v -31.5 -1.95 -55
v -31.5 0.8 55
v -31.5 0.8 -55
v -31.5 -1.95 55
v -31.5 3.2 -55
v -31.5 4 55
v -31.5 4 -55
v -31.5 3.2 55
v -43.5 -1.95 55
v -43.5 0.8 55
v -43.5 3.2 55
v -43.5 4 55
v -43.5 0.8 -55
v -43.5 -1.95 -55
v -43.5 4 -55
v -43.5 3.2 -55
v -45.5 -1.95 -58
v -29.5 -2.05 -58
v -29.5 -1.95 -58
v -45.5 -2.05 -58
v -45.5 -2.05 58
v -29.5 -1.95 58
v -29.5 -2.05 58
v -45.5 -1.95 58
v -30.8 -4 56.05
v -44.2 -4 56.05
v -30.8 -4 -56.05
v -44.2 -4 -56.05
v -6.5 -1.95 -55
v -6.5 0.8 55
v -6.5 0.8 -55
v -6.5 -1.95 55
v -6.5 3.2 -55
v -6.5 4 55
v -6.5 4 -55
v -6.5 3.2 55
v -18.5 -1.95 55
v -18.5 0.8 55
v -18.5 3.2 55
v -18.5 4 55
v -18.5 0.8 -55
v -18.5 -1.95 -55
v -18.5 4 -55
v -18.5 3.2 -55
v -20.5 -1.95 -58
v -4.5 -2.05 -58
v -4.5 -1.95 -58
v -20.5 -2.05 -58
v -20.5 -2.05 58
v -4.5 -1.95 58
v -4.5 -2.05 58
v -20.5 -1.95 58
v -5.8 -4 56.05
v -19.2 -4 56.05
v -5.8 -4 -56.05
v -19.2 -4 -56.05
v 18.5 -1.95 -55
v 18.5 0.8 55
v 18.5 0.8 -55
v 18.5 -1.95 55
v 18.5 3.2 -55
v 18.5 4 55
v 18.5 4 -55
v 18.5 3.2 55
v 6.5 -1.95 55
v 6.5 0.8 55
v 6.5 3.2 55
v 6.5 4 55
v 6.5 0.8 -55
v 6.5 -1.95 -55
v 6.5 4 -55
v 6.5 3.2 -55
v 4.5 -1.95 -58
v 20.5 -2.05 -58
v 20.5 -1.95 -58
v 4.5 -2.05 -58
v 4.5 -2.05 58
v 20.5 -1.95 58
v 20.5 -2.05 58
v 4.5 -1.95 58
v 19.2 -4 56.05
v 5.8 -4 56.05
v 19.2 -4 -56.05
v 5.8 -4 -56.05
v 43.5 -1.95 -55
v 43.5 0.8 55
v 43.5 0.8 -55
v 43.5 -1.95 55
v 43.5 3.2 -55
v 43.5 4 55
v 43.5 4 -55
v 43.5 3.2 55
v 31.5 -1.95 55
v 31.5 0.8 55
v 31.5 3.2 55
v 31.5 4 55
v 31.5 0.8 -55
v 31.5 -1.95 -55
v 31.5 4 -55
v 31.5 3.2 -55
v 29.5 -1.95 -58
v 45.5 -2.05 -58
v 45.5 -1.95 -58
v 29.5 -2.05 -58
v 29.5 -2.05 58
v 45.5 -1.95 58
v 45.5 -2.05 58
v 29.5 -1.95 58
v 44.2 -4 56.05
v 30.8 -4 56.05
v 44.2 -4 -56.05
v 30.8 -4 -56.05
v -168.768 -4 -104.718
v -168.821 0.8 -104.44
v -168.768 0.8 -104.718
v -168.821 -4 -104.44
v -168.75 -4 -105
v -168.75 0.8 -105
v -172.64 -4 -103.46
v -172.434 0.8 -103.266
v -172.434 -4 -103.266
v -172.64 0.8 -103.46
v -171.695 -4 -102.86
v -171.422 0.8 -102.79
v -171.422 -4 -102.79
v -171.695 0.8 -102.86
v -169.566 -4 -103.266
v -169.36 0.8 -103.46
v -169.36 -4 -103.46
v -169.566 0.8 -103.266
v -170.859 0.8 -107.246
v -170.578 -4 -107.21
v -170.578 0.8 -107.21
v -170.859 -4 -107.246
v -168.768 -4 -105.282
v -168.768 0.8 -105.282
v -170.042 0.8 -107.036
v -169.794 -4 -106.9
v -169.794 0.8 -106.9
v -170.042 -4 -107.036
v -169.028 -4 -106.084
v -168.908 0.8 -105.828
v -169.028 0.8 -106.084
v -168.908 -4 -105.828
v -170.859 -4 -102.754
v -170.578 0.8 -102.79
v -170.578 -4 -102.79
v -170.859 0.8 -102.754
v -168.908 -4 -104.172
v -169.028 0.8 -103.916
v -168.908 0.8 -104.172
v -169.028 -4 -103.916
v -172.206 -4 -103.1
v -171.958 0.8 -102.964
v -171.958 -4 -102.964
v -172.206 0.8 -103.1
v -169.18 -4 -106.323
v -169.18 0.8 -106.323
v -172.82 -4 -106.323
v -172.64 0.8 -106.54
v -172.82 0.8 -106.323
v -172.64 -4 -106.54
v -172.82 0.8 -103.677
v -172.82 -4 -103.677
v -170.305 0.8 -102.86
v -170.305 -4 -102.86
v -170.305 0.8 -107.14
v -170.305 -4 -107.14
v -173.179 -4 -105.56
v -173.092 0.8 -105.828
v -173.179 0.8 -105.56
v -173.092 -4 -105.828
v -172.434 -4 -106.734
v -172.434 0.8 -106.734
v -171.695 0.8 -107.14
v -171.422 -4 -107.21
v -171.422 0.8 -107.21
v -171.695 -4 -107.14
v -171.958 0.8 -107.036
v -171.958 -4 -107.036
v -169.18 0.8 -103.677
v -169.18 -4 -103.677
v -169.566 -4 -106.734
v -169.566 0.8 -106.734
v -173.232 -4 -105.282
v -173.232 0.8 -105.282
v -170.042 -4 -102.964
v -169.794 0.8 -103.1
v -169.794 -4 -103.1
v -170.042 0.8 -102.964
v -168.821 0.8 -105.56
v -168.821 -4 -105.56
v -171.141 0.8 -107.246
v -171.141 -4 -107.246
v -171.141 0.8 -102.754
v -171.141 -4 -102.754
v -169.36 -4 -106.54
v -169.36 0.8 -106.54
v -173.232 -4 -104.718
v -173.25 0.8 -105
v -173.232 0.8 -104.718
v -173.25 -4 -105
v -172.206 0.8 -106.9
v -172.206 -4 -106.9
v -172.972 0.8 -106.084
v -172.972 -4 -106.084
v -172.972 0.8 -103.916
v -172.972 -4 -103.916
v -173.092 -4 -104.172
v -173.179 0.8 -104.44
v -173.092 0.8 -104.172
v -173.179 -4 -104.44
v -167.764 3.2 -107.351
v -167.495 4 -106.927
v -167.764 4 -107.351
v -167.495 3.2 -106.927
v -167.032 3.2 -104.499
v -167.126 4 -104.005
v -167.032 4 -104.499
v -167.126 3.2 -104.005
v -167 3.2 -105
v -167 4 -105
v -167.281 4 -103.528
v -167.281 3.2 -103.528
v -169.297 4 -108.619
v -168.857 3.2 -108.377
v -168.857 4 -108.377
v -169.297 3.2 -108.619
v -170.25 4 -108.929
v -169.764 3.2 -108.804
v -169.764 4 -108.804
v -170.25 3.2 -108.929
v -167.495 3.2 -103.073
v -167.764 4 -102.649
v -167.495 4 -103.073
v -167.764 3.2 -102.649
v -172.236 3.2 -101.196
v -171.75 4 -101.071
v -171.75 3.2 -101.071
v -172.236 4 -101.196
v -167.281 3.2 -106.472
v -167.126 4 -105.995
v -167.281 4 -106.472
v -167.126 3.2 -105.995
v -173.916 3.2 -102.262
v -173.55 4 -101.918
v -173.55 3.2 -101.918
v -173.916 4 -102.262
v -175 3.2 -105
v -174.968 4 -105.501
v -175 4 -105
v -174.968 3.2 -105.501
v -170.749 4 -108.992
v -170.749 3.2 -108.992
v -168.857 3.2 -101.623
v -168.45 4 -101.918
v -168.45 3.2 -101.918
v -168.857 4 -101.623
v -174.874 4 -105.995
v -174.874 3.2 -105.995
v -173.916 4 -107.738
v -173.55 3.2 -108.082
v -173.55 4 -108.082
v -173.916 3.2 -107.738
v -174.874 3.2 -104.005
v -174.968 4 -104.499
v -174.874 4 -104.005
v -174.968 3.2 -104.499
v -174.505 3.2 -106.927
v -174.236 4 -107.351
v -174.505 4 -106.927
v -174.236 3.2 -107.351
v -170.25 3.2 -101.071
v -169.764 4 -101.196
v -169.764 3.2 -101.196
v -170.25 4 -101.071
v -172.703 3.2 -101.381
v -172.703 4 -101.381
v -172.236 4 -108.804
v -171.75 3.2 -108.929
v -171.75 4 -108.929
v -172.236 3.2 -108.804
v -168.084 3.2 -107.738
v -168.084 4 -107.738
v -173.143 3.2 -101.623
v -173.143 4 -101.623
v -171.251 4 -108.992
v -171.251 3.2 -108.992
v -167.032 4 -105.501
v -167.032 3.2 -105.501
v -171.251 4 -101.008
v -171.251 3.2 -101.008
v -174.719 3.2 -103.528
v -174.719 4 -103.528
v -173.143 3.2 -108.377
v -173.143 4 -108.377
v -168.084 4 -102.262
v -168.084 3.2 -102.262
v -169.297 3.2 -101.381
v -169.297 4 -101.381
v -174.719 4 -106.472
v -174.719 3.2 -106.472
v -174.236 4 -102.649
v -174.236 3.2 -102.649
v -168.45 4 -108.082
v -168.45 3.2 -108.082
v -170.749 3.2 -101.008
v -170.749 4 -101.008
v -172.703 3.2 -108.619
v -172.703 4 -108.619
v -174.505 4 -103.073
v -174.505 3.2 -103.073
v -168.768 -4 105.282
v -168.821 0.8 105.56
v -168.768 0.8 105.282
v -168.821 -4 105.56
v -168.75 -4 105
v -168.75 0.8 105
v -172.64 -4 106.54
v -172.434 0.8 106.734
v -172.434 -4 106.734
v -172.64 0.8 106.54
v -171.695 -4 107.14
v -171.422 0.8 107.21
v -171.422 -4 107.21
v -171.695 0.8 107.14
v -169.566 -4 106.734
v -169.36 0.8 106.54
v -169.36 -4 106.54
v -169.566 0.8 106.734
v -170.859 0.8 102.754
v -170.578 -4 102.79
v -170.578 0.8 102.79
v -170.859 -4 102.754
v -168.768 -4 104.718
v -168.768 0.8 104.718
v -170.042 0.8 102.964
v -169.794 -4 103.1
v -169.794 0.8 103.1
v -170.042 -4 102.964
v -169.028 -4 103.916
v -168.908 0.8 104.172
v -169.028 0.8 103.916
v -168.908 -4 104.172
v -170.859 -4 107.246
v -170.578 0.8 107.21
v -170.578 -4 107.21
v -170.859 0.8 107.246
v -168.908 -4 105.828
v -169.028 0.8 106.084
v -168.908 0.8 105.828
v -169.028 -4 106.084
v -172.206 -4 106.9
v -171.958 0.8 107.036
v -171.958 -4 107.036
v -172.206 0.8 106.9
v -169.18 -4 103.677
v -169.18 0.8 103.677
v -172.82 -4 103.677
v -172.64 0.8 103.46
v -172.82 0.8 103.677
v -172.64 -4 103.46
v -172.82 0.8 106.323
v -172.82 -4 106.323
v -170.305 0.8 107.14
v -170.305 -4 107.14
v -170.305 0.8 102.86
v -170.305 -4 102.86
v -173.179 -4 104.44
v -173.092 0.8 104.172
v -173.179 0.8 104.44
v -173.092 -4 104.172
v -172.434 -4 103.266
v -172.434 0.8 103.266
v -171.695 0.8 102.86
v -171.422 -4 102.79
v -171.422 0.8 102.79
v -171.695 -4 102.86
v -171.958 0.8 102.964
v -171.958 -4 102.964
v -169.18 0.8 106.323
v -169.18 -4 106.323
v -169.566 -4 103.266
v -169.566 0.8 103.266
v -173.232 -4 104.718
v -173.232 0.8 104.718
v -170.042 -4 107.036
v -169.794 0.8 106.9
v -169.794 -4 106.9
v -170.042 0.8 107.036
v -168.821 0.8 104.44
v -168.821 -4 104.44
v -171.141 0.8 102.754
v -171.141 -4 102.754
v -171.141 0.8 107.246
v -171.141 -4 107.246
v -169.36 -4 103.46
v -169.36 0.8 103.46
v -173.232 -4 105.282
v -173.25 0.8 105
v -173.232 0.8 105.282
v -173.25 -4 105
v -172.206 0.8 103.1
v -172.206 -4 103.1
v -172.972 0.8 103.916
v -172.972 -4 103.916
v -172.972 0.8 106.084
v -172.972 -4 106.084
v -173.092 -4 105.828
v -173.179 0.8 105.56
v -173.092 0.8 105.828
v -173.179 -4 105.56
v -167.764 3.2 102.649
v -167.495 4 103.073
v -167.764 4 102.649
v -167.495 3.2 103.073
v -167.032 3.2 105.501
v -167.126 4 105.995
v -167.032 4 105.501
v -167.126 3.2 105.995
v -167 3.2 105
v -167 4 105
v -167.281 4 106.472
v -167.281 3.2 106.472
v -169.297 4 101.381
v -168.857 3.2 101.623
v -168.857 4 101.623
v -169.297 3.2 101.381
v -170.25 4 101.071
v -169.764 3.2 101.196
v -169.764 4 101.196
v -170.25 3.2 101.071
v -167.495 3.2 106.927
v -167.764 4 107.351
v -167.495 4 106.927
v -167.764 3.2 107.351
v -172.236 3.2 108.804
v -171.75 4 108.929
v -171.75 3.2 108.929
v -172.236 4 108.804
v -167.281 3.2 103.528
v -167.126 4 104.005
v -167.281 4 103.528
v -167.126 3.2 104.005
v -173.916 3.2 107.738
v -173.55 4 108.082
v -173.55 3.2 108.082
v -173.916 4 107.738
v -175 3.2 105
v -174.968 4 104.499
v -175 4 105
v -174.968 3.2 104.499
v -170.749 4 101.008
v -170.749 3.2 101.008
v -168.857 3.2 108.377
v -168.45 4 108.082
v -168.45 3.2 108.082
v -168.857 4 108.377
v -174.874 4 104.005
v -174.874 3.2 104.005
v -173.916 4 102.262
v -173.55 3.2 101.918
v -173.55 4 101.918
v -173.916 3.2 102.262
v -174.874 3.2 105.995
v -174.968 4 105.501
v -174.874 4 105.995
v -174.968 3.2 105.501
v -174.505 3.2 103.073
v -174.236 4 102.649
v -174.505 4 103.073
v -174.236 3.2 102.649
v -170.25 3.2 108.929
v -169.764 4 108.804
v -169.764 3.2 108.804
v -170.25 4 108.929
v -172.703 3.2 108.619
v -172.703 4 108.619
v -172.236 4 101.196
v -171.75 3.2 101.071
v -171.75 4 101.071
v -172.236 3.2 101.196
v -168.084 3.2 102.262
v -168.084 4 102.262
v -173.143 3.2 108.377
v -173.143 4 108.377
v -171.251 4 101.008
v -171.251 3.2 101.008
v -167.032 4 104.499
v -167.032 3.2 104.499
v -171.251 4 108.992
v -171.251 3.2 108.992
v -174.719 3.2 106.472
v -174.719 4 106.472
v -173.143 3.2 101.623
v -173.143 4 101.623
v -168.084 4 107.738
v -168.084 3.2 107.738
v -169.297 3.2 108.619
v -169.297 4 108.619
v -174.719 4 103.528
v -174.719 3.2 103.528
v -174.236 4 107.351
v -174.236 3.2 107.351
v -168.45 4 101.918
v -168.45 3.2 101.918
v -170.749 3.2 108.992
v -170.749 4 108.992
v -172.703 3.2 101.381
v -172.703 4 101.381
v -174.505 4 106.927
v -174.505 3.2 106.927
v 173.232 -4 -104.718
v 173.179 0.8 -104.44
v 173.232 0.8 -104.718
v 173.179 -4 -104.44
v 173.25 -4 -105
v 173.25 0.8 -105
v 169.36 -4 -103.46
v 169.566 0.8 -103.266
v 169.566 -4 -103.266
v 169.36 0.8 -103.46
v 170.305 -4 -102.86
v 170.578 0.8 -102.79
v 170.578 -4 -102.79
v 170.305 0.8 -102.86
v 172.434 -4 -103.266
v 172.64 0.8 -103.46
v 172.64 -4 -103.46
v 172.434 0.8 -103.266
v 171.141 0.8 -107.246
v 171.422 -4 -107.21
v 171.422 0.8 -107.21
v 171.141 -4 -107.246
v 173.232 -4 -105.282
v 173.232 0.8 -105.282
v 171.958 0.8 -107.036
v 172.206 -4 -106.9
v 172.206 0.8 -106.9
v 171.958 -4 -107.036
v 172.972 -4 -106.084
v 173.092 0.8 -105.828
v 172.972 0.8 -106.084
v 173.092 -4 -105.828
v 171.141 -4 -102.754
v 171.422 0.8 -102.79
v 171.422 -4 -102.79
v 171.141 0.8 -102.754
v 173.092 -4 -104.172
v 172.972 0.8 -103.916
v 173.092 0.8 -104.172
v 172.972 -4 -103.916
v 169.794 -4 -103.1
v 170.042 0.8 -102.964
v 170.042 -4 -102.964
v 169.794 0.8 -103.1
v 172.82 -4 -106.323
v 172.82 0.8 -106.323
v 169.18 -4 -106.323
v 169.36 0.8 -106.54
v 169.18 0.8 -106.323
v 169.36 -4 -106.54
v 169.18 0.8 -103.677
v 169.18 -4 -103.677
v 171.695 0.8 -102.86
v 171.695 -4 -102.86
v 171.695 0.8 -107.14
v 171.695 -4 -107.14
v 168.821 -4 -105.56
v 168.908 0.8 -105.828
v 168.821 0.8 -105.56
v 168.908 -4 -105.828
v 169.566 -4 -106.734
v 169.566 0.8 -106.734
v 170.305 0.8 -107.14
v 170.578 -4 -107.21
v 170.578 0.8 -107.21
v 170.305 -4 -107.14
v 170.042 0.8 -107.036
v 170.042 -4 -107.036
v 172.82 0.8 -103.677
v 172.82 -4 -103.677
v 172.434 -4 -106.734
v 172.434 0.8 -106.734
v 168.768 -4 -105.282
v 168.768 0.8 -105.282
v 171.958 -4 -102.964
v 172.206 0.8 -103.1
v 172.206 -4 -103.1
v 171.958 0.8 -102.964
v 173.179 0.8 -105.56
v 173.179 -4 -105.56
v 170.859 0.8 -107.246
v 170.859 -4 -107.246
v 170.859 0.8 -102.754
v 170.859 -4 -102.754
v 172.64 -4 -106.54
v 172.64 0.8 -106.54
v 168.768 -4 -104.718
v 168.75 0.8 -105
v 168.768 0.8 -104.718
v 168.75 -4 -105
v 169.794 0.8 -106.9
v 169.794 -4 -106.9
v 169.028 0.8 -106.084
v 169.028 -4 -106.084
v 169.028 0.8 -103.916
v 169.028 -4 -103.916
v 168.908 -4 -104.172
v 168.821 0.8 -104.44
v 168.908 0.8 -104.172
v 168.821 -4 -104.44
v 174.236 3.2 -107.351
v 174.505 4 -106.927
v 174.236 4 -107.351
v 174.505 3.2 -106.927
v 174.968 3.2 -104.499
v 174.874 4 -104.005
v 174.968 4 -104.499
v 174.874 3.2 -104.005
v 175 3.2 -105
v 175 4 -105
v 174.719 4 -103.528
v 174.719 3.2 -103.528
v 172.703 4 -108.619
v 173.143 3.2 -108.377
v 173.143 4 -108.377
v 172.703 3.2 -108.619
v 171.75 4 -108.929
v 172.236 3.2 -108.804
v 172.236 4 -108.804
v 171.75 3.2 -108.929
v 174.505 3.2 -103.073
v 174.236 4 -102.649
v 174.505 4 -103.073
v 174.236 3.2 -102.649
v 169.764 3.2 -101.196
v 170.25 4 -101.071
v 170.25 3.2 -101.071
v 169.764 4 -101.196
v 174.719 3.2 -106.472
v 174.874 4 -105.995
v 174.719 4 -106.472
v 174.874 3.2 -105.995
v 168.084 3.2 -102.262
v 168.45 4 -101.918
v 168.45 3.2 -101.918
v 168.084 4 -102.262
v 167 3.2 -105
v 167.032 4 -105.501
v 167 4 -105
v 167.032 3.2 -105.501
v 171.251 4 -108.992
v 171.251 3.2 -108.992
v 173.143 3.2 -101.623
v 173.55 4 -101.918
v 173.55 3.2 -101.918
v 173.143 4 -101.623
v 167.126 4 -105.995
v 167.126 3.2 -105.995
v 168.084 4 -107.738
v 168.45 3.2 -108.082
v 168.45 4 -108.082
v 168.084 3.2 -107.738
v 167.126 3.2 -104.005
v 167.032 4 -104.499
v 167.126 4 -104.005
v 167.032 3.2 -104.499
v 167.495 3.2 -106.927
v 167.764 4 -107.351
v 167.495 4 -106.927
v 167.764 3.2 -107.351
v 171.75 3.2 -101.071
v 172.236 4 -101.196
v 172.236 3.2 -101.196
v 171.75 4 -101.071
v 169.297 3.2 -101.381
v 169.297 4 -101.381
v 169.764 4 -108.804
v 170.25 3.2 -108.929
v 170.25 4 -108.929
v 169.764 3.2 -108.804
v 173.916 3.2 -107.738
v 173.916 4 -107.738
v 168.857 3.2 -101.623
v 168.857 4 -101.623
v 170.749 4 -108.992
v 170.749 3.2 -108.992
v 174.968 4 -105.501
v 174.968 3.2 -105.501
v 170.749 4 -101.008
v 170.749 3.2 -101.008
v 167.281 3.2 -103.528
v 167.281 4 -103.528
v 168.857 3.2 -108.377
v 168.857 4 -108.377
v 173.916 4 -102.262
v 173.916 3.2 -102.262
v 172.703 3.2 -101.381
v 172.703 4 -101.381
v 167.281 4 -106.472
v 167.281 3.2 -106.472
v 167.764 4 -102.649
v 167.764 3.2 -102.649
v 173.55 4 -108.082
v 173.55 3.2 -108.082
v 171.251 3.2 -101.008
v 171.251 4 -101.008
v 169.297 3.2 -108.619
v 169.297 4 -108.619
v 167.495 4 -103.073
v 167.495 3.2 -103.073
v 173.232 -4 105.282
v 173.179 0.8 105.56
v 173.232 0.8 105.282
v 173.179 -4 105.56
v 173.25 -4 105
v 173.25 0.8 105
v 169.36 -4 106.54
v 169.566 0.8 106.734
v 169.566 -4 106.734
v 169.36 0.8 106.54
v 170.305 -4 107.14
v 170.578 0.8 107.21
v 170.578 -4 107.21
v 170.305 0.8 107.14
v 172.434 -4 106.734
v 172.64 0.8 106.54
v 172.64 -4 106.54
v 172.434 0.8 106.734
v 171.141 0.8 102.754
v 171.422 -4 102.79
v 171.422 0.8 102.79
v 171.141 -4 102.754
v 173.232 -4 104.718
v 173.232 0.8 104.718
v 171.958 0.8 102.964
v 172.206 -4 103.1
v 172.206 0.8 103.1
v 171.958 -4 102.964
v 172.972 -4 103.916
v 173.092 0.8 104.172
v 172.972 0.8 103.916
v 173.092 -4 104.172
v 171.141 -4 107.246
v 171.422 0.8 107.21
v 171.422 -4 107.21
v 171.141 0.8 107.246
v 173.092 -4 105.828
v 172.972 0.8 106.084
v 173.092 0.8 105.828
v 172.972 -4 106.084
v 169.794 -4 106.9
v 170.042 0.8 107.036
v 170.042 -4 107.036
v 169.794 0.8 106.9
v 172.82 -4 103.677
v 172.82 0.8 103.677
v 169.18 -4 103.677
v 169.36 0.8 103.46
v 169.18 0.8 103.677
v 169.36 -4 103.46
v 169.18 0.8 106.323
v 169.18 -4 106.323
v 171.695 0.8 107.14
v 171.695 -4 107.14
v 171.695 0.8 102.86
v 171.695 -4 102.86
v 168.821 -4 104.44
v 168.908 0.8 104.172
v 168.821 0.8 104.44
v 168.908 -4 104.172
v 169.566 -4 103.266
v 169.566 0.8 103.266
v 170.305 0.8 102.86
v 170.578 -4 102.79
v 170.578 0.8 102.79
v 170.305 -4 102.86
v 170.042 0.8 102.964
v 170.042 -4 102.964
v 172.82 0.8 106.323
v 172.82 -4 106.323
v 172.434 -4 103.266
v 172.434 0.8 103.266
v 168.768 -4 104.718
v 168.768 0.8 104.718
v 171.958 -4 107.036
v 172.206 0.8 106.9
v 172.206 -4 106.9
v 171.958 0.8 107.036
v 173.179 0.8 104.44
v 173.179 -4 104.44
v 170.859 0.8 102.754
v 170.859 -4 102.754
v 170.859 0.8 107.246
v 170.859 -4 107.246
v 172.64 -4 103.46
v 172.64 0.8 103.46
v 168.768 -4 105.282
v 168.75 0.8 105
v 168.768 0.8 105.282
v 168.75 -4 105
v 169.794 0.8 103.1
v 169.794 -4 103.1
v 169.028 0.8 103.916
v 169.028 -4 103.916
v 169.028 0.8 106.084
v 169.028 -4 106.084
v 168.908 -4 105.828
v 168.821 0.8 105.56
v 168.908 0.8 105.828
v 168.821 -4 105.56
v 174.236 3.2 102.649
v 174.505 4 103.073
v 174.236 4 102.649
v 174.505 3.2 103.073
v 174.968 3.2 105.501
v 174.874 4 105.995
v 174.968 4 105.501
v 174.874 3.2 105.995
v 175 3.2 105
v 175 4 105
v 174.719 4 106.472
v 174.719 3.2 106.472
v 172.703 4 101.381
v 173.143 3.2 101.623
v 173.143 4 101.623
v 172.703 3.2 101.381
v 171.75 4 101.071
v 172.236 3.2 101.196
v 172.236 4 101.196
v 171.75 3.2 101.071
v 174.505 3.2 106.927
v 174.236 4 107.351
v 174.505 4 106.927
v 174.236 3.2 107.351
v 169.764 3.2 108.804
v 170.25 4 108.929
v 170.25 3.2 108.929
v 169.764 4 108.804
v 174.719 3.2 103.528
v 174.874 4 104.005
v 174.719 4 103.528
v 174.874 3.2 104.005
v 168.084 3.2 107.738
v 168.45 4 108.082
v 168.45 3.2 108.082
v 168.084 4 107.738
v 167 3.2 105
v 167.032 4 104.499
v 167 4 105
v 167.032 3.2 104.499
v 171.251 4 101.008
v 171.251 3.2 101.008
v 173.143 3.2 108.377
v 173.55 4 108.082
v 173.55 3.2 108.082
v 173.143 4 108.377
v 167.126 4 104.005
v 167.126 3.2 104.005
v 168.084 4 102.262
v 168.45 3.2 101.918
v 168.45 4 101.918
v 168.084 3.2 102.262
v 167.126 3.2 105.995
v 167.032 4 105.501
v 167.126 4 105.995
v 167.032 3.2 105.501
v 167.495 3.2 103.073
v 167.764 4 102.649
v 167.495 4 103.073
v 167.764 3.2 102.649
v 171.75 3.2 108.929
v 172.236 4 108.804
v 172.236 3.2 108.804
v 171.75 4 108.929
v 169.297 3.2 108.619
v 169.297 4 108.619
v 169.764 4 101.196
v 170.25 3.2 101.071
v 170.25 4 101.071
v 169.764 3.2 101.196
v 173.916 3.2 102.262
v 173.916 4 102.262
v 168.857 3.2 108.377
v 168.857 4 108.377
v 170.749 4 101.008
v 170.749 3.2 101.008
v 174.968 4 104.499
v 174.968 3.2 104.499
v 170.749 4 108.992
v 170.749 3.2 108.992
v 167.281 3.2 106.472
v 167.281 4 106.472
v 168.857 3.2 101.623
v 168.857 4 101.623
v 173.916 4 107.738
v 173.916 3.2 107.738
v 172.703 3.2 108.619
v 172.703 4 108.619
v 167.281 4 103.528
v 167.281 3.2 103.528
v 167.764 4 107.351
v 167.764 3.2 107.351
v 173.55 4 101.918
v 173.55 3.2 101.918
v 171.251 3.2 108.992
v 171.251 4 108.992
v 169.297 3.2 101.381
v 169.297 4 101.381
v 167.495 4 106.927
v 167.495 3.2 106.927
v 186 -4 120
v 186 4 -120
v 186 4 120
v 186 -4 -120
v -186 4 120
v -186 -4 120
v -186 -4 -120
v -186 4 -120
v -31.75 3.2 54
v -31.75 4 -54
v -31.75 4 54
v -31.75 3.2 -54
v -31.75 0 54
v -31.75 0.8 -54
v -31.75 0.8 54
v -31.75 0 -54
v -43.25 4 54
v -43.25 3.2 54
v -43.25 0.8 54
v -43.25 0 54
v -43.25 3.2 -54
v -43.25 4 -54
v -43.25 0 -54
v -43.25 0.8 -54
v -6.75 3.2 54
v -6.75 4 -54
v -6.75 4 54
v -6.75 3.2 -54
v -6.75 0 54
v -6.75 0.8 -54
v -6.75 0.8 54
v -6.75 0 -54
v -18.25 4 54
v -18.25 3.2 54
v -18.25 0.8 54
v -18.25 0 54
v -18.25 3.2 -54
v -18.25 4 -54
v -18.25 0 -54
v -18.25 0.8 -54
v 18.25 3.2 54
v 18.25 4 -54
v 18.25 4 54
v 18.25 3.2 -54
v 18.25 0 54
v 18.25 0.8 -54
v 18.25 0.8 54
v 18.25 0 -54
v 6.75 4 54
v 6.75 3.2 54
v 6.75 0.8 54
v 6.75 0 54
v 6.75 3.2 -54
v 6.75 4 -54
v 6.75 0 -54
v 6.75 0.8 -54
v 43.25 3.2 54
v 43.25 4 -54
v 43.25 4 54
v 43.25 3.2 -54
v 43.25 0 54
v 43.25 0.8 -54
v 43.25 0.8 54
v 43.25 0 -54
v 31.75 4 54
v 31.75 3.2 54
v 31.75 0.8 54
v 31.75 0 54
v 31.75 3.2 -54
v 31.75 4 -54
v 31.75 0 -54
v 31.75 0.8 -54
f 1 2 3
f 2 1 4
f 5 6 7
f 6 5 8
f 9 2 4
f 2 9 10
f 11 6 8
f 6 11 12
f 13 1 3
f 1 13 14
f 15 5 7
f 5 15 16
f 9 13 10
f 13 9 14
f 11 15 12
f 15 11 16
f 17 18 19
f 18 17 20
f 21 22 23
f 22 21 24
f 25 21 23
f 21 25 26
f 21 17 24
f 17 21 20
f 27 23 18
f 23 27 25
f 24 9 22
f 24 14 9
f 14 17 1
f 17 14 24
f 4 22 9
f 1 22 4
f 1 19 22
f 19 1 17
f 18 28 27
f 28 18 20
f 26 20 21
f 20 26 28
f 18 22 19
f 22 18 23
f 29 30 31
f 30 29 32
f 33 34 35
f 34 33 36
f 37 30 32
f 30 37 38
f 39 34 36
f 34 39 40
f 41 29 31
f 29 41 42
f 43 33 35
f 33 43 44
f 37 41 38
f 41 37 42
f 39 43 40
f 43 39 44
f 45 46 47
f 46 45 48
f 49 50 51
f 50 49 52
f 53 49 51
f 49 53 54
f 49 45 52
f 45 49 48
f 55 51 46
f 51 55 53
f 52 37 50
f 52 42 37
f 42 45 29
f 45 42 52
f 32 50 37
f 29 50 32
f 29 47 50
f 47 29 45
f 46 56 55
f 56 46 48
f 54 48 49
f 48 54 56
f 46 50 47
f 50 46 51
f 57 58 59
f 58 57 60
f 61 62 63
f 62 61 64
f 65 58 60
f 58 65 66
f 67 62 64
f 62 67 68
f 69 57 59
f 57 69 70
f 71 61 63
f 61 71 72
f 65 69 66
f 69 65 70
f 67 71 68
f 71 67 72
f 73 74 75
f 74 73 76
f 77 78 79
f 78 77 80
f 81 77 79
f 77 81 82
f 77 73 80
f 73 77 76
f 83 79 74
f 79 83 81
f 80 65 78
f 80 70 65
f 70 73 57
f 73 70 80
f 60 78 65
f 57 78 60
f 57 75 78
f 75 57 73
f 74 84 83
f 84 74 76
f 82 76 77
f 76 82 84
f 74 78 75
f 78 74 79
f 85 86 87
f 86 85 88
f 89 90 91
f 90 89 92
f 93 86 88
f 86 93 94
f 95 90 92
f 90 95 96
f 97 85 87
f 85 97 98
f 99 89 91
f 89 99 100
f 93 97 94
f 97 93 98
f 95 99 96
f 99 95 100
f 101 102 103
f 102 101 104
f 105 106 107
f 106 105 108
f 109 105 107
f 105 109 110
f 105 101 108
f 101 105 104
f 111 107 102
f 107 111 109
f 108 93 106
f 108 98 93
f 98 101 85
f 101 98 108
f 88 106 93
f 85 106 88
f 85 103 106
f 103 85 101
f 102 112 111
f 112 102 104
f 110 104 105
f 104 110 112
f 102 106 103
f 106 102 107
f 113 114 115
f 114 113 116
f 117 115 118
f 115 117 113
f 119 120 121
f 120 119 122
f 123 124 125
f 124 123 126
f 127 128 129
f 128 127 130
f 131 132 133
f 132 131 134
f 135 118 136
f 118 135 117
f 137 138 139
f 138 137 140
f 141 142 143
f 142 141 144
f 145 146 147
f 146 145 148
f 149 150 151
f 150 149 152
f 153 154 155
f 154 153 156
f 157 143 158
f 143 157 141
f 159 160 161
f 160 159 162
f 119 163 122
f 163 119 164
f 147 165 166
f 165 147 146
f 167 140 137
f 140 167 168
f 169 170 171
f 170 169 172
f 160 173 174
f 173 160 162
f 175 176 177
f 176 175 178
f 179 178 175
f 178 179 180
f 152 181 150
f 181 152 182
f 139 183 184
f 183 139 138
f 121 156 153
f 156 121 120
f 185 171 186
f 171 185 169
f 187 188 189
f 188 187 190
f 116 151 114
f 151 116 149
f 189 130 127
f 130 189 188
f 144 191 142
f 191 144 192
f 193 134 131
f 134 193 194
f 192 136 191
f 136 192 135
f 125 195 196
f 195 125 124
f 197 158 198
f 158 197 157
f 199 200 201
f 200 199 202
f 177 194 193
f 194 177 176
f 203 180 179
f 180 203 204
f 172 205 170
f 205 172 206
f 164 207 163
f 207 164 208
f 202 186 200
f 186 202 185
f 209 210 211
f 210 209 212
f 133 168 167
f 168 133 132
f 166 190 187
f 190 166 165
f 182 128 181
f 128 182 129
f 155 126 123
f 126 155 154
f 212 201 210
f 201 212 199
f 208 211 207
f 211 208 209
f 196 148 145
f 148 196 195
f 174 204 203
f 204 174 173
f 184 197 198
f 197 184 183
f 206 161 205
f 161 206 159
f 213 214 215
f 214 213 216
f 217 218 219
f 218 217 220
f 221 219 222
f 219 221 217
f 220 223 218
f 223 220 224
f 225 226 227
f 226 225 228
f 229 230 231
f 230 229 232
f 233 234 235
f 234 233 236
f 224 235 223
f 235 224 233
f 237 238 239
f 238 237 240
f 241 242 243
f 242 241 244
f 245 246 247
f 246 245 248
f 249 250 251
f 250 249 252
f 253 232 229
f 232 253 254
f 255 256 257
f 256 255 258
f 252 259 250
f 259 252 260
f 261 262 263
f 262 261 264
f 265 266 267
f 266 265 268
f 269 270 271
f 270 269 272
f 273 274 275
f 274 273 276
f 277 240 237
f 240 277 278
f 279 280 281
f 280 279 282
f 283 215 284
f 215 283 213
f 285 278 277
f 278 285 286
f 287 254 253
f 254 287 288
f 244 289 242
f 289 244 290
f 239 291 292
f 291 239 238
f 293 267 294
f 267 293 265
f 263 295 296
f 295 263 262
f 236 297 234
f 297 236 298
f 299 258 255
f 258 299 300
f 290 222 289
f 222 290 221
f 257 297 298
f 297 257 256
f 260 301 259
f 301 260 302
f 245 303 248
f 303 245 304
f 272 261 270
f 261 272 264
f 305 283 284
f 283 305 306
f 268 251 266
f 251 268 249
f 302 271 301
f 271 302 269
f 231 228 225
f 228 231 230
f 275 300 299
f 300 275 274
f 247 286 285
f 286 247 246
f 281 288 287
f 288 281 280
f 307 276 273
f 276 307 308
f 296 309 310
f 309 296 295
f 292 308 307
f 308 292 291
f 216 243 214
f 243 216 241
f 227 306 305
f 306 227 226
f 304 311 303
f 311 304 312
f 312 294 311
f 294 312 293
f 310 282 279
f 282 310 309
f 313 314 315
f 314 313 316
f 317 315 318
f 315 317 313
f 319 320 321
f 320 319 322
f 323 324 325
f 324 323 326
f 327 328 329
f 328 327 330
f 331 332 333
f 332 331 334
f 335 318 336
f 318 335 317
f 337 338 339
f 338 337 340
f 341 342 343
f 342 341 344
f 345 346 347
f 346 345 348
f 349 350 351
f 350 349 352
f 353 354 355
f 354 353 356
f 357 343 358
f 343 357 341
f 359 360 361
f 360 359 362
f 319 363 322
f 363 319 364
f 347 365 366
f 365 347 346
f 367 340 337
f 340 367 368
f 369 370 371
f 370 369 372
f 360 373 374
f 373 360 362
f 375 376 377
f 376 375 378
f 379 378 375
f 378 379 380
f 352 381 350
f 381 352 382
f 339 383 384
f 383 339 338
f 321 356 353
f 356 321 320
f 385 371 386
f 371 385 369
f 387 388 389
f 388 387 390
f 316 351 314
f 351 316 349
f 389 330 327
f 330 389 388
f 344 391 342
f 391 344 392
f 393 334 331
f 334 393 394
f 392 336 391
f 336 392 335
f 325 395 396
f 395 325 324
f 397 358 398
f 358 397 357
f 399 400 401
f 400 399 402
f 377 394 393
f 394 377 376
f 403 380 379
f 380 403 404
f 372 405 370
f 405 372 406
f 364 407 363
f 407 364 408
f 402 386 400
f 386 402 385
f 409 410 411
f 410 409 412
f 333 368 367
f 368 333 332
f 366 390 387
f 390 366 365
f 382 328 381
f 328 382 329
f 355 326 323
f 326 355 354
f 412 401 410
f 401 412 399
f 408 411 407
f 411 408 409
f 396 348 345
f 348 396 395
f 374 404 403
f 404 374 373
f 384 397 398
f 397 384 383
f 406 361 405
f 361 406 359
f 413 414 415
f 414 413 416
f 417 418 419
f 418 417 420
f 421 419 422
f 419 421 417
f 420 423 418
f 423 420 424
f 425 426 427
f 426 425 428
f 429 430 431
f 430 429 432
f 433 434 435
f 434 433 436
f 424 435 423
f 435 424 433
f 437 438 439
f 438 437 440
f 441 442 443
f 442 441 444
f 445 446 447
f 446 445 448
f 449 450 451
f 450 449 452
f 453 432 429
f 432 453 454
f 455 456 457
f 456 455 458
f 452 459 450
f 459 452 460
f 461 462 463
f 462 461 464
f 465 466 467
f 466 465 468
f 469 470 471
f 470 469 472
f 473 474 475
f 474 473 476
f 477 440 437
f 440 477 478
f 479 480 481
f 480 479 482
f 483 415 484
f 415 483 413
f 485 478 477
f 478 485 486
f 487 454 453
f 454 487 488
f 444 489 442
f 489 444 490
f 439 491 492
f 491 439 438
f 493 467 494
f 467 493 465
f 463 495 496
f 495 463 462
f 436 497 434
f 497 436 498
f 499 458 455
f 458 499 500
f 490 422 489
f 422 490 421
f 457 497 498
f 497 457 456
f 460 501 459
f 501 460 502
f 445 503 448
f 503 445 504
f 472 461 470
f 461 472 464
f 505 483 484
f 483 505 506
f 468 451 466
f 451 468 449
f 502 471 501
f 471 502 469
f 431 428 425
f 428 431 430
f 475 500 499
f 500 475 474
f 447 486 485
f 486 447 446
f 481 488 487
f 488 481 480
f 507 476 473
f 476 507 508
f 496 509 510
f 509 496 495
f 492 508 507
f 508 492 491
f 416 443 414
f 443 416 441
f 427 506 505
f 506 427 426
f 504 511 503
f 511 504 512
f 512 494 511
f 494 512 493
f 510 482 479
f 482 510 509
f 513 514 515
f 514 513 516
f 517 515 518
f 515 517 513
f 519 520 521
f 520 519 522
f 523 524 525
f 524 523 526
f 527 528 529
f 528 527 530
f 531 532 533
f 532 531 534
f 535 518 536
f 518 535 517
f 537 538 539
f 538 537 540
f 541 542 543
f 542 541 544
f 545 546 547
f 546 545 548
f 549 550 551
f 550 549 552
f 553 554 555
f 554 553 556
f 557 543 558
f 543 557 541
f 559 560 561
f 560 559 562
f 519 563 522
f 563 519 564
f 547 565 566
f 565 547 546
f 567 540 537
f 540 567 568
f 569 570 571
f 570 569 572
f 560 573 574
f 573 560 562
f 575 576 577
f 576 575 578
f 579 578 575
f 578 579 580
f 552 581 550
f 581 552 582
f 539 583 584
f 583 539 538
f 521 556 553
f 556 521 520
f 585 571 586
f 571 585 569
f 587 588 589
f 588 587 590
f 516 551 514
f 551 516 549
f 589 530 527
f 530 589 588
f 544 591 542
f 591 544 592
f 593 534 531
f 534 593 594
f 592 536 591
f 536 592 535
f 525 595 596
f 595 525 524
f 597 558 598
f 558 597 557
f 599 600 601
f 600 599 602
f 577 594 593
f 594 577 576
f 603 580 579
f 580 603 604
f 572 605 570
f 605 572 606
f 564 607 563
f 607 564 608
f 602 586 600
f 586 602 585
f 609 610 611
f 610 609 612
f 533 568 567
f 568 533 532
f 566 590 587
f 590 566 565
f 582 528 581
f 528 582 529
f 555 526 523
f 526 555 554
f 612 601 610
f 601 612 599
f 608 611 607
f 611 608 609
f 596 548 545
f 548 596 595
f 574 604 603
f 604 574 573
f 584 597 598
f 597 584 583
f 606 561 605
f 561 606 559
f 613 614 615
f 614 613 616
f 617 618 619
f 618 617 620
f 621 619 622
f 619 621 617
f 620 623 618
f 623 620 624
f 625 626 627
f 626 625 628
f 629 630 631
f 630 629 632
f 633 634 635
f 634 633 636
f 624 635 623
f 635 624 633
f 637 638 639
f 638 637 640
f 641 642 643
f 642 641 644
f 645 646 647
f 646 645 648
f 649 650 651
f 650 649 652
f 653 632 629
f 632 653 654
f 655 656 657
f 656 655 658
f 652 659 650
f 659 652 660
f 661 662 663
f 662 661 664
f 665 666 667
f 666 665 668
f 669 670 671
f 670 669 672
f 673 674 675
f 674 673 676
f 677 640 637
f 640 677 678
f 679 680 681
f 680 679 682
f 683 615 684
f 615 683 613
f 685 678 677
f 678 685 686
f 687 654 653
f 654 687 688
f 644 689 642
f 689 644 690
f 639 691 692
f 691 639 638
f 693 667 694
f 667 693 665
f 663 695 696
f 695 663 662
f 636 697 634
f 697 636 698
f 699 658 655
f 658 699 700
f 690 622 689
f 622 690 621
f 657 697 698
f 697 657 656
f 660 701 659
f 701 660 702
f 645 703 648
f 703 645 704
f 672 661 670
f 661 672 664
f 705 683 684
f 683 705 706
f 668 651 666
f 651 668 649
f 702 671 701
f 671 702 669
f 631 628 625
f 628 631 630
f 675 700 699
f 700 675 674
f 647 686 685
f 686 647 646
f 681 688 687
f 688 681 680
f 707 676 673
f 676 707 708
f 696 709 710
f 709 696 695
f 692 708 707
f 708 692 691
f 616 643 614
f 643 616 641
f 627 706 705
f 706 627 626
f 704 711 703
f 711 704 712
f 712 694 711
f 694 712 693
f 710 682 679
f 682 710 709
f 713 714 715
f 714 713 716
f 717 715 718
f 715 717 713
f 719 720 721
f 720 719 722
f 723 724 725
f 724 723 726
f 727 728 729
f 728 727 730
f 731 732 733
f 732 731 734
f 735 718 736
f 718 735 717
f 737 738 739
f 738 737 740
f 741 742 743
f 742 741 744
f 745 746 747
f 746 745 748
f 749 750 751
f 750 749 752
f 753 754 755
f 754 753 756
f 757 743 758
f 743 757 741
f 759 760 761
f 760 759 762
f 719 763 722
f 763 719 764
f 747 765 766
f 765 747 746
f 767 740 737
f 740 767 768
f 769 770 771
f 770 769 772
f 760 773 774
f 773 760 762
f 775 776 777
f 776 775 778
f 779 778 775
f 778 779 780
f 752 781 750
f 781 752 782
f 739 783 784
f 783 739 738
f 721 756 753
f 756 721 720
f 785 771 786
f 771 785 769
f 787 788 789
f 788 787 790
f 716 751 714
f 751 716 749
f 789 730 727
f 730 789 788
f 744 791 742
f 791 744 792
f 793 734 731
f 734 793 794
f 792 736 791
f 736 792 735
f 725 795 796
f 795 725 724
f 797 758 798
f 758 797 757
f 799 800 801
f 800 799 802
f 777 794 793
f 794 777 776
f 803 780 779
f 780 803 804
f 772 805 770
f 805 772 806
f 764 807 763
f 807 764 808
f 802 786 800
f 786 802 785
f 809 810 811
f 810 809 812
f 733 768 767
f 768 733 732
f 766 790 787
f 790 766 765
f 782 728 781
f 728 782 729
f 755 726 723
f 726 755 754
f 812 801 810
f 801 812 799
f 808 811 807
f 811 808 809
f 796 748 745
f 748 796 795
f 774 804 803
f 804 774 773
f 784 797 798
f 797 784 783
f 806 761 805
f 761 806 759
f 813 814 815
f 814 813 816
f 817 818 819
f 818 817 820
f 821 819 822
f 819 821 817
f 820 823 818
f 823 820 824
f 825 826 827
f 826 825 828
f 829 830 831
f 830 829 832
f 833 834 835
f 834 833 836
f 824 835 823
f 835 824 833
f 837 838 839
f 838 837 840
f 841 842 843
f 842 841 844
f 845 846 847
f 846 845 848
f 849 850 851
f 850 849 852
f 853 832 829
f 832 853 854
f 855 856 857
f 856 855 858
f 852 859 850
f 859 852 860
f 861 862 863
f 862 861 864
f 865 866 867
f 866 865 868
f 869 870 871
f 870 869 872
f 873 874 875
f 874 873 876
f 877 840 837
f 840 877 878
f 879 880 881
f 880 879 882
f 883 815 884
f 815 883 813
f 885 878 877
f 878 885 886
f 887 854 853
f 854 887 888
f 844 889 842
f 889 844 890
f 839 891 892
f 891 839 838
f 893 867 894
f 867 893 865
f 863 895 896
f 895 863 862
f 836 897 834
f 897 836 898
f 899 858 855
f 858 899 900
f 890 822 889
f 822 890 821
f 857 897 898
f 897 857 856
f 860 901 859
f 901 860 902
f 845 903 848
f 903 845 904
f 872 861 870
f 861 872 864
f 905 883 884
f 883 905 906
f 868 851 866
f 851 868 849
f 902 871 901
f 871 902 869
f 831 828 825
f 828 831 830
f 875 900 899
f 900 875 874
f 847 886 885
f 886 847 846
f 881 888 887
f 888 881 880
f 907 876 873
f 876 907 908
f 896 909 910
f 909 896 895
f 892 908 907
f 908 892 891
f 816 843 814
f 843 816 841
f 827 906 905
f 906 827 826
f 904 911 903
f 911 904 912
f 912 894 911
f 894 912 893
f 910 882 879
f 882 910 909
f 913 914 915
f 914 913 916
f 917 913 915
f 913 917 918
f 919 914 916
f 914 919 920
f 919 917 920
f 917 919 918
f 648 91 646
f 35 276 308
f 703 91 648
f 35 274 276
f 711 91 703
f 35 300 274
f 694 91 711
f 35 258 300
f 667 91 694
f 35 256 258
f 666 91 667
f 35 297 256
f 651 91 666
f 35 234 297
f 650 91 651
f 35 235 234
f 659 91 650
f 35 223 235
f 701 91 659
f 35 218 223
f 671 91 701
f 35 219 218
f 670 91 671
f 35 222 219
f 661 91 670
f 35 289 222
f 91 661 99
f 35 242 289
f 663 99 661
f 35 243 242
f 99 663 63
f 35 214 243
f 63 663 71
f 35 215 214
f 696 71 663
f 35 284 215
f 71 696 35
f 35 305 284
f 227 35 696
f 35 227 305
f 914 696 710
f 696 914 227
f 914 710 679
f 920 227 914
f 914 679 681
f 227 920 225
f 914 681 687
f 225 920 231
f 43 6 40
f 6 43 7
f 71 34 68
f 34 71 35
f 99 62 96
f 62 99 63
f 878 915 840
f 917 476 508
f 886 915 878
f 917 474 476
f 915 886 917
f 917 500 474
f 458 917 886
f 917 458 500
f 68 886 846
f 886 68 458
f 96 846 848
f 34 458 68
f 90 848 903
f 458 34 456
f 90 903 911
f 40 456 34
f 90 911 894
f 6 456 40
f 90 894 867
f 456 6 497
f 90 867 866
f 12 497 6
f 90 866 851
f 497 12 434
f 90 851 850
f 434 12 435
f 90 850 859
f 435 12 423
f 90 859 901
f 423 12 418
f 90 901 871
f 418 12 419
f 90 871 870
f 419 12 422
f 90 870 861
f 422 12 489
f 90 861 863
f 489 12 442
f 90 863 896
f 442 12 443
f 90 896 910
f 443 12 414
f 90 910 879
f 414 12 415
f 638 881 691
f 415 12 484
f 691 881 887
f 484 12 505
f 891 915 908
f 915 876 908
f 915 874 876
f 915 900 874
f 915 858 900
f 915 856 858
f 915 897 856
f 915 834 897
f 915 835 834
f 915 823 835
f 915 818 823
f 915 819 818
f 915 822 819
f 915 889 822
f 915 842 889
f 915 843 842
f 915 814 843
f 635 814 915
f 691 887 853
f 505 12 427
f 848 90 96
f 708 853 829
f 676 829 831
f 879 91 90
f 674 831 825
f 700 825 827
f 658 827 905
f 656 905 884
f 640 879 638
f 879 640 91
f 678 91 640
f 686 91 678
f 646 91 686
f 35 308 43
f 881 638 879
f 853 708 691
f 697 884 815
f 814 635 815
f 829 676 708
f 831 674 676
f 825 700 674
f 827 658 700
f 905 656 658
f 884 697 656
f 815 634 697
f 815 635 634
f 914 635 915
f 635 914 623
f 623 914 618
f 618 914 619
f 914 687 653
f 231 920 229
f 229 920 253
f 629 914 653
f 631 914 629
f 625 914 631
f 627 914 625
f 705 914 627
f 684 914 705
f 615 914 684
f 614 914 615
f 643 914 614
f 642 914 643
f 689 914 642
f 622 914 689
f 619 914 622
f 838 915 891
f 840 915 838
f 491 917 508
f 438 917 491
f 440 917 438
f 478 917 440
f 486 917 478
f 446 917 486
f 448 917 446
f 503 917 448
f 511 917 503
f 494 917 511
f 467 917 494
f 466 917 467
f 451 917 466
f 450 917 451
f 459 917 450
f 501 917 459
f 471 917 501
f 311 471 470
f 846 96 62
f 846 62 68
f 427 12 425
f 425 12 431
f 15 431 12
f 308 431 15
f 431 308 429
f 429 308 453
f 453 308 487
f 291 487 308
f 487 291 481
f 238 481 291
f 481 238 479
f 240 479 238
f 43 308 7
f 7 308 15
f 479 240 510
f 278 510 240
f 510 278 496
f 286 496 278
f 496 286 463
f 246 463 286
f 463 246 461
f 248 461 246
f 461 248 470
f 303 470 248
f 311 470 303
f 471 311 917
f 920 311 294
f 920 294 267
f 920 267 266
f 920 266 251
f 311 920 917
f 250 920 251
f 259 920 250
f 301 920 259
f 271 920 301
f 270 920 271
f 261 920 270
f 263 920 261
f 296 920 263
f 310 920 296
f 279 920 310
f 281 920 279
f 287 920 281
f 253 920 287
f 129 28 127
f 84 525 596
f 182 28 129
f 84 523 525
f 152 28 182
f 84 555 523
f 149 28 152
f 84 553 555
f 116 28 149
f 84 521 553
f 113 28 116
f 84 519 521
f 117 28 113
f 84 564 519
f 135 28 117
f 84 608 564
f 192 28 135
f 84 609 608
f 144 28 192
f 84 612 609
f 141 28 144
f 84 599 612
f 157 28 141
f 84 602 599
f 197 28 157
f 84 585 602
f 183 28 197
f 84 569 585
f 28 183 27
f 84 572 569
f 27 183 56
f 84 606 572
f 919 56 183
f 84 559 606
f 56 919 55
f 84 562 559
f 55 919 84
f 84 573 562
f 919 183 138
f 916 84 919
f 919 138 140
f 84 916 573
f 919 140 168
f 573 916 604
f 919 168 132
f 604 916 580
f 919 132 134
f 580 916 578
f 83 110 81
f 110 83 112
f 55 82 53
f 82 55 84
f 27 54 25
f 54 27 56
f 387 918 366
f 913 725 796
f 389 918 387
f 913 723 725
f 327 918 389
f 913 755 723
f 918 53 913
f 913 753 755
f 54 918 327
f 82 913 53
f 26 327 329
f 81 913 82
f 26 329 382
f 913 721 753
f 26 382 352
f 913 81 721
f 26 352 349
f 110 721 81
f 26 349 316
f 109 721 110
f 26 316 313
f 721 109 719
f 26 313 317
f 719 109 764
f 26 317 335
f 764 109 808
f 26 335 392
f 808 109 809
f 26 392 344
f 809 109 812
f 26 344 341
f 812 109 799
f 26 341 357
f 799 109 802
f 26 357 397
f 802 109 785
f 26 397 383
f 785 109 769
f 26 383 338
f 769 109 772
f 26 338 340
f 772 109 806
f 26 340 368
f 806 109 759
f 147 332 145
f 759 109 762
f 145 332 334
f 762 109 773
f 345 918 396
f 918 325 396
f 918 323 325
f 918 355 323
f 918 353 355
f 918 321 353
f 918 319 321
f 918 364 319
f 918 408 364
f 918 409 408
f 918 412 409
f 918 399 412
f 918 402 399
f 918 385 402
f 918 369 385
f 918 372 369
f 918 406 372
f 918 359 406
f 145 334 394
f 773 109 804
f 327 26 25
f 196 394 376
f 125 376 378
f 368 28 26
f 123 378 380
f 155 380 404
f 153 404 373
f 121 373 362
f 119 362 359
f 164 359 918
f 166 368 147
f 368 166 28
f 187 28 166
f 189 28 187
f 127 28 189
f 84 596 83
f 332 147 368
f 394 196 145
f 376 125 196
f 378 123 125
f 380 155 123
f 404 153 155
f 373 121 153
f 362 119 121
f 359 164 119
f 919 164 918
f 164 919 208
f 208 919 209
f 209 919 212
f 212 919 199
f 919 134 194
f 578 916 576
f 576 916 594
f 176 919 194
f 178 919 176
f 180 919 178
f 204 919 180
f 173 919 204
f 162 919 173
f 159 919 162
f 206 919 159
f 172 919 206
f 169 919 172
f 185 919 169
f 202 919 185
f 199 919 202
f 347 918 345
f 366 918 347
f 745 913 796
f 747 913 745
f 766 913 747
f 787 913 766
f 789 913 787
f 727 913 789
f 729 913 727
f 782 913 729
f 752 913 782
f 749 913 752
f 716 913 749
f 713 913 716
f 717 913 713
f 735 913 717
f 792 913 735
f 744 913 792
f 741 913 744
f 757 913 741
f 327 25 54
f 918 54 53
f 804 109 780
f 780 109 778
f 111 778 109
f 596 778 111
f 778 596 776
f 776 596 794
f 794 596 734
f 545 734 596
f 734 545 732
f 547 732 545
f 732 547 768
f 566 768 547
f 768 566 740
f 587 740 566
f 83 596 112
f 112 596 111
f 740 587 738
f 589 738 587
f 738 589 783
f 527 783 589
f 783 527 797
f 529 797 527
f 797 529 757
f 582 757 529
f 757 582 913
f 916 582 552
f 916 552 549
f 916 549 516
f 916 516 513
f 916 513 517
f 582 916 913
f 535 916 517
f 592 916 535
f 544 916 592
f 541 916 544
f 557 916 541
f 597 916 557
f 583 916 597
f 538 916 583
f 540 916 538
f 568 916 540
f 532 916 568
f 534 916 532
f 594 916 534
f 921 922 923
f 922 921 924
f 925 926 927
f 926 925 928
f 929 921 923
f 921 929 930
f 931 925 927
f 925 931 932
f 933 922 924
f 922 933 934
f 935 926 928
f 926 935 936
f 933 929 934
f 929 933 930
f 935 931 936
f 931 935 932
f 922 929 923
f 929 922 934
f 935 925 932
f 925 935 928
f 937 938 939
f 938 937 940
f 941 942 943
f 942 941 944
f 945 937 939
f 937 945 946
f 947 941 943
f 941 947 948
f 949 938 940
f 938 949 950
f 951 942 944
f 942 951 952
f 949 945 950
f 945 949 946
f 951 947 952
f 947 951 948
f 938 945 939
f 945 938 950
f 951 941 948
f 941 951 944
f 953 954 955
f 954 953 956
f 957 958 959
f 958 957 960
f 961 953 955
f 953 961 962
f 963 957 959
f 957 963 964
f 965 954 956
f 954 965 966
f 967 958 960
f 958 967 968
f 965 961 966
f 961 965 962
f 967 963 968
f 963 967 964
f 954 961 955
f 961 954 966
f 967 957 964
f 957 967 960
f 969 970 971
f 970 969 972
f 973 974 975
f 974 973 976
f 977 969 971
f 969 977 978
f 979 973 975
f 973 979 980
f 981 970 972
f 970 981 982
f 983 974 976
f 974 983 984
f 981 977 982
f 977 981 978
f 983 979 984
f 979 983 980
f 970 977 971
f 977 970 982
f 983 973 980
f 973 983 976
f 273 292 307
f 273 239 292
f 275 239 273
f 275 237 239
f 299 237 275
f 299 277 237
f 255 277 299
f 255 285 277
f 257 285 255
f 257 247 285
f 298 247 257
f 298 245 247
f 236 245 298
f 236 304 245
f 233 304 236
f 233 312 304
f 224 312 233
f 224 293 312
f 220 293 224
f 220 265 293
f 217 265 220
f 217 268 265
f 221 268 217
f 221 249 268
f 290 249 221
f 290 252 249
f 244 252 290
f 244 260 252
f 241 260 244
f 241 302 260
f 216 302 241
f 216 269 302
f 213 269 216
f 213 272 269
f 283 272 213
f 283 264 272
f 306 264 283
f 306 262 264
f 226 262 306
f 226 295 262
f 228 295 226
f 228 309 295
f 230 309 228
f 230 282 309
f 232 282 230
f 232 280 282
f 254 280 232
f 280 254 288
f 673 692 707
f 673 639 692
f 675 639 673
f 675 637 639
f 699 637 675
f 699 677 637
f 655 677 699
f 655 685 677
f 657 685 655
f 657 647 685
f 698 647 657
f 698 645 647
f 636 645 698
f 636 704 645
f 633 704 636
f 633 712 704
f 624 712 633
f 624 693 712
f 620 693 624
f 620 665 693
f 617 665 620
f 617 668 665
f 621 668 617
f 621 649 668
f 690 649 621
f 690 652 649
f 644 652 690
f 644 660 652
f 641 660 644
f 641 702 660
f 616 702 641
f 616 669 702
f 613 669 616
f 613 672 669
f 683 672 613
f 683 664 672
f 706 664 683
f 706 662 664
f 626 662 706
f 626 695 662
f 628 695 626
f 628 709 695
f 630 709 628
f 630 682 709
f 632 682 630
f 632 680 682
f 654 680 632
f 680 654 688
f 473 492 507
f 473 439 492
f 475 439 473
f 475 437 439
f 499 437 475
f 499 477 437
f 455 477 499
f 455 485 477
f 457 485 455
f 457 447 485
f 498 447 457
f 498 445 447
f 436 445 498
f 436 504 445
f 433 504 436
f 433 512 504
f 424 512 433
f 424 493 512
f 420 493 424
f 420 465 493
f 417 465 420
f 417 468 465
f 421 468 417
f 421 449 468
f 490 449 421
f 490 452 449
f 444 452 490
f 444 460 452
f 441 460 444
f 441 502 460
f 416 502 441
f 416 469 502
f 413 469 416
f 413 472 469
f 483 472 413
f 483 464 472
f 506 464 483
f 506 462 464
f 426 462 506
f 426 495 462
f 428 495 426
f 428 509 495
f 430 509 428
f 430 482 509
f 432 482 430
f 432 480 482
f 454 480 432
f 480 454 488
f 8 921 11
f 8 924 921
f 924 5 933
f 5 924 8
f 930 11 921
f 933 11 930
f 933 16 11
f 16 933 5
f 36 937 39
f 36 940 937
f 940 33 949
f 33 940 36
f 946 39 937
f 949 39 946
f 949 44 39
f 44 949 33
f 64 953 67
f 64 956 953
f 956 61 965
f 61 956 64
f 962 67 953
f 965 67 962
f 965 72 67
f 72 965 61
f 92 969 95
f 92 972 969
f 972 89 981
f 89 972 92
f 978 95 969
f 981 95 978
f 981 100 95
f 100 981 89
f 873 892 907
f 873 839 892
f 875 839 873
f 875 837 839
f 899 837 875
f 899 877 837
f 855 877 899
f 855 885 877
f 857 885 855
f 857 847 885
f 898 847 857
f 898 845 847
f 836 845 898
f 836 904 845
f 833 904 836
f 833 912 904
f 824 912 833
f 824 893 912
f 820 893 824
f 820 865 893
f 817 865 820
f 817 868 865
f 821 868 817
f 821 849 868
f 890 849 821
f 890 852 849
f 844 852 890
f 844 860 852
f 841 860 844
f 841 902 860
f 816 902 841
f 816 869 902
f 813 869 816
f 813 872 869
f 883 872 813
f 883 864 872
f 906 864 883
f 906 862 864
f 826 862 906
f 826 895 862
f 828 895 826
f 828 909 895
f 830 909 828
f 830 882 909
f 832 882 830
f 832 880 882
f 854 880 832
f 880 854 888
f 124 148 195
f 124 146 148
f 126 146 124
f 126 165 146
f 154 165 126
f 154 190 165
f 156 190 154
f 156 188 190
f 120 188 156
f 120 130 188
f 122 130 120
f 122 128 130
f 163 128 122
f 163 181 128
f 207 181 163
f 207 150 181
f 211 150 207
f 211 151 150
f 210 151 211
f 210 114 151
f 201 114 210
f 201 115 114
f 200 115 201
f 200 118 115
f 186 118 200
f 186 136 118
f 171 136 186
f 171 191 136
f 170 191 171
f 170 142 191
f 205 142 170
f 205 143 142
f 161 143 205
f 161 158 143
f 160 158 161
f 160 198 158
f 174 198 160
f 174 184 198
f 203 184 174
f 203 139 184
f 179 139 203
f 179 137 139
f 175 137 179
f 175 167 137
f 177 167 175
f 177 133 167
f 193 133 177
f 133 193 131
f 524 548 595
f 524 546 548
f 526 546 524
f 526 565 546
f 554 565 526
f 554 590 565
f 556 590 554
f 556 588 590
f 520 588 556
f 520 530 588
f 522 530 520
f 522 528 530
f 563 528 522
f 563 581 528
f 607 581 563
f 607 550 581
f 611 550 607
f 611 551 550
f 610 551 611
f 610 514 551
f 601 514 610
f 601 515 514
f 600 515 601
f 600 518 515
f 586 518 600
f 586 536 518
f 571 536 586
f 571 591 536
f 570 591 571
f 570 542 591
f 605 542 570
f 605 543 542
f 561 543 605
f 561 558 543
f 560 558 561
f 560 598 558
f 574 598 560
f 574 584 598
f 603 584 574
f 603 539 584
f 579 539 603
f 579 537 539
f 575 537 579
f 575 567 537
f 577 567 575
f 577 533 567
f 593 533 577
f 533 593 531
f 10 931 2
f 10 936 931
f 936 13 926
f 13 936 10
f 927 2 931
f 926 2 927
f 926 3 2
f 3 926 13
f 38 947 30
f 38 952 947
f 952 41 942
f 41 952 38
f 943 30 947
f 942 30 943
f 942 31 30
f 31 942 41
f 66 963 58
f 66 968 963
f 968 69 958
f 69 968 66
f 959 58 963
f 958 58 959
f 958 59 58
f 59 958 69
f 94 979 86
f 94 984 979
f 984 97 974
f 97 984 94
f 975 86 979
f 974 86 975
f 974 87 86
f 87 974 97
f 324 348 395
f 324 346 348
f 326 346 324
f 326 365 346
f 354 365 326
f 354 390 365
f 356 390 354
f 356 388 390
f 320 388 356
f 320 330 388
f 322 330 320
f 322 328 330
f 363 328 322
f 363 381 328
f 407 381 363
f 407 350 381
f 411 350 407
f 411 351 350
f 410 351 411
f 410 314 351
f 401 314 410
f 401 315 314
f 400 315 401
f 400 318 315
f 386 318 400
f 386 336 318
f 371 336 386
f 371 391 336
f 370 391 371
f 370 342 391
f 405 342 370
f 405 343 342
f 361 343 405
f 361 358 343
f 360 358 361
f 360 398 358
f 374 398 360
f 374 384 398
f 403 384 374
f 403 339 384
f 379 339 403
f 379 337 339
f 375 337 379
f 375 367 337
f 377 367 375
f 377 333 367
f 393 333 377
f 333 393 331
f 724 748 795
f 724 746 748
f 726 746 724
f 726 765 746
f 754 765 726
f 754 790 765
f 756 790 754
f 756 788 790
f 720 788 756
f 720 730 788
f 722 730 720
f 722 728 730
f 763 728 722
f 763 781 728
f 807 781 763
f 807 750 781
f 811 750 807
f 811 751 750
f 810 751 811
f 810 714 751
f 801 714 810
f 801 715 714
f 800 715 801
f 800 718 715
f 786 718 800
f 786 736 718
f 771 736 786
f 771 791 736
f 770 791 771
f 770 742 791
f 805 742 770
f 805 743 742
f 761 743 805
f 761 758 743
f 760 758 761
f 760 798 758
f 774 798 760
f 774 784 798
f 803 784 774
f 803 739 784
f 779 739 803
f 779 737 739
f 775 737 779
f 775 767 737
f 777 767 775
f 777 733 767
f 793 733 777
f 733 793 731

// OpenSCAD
// ========================================================
// F-14F AVIONICS MODERNIZATION KIT - REAR BACKPLANE DOCK
// MECHANICAL CARD ALIGNMENT GUIDE & CONNECTOR FRAME
// ========================================================

$fn = 50; // High-precision manufacturing circular interpolation

// --- CHASSIS REAR WALL HOUSING SPECIFICATIONS (mm) ---
backplane_width  = 372; // Internal horizontal clearance limit
backplane_height = 240; // Internal vertical clearance ceiling
plate_thickness  = 8.0; // PEEK structural reinforcement panel wall depth

card_slot_spacing = 25.0; // Spacing pitch center-to-center between slots
num_slots         = 4;    // Slots for Univac IX, Hex Logic, Aegis, Weather
socket_w          = 12.0; // Horizontal width of card-edge receiver socket
socket_h          = 110.0;// Vertical clearance height of high-density socket block

// --- COLOR PALETTE ---
peek_black   = [0.15, 0.15, 0.17, 1.0]; // Carbon-filled high-durability polymer frame
fr4_green    = [0.12, 0.44, 0.22, 0.8]; // Multilayer backplane PCB substrate backing
gold_contact = [0.88, 0.73, 0.28, 1.0]; // Gold-plated high-density socket pins
screw_silver = [0.75, 0.78, 0.80, 1.0]; // Chassis perimeter anchoring hardware

// ========================================================
// MECHANICAL MODEL ASSEMBLY
// ========================================================

module backplane_guide_assembly() {
    // 1. Structural FR4 Multilayer Wiring Substrate (The backing PCB)
    color(fr4_green)
        translate([0, 2, 0])
        cube([backplane_width, 2.4, backplane_height], center=true);

    // 2. Heavy-Duty Polymer Alignment Guide Panel Shell
    difference() {
        color(peek_black)
            cube([backplane_width, plate_thickness, backplane_height], center=true);
            
        // Subtract vertical channels for the high-density card-edge socket housings
        for (i = [0 : num_slots - 1]) {
            // Programmatically calculate dynamic X offset for each slot path
            x_offset = -((num_slots - 1) * card_slot_spacing) / 2 + (i * card_slot_spacing);
            
            // Central connector pocket cutout
            translate([x_offset, 0, 0])
                cube([socket_w, plate_thickness + 2, socket_h], center=true);
                
            // --- PLUG-AND-PLAY FEATURE: Beveled Tapered Entry Slits ---
            // Catches incoming card edges and self-aligns them into the socket contacts
            translate([x_offset, -plate_thickness/2 + 2, 0])
                rotate([0, 0, 0])
                hull() {
                    cube([socket_w + 4.0, 0.1, socket_h + 6.0], center=true);
                    translate([0, -3.0, 0]) 
                        cube([socket_w, 0.1, socket_h], center=true);
                }
        }
        
        // Perimeter counter-sunk mounting holes to anchor the frame to the chassis rear wall
        for (x_bolt = [-backplane_width/2 + 15, backplane_width/2 - 15]) {
            for (z_bolt = [-backplane_height/2 + 15, backplane_height/2 - 15]) {
                translate([x_bolt, 0, z_bolt])
                    rotate([90, 0, 0]) {
                        cylinder(d=4.5, h=plate_thickness + 4, center=true); // Screw shank
                        translate([0, 0, -3.5]) cylinder(d=8.0, h=4.0, center=true); // Countersunk head
                    }
            }
        }
    }

    // 3. High-Density Gold Contact Socket Modules (Seated inside the cutouts)
    for (i = [0 : num_slots - 1]) {
        x_offset = -((num_slots - 1) * card_slot_spacing) / 2 + (i * card_slot_spacing);
        translate([x_offset, plate_thickness/2 - 2, 0]) {
            color([0.1, 0.1, 0.1]) cube([socket_w - 0.5, 4.0, socket_h - 2], center=true);
            // Internal gold leaf pin matrix simulation
            color(gold_contact) translate([0, -1, 0]) cube([2.0, 1.0, socket_h - 10], center=true);
        }
    }
}

// Execute active rendering tree module
backplane_guide_assembly();
